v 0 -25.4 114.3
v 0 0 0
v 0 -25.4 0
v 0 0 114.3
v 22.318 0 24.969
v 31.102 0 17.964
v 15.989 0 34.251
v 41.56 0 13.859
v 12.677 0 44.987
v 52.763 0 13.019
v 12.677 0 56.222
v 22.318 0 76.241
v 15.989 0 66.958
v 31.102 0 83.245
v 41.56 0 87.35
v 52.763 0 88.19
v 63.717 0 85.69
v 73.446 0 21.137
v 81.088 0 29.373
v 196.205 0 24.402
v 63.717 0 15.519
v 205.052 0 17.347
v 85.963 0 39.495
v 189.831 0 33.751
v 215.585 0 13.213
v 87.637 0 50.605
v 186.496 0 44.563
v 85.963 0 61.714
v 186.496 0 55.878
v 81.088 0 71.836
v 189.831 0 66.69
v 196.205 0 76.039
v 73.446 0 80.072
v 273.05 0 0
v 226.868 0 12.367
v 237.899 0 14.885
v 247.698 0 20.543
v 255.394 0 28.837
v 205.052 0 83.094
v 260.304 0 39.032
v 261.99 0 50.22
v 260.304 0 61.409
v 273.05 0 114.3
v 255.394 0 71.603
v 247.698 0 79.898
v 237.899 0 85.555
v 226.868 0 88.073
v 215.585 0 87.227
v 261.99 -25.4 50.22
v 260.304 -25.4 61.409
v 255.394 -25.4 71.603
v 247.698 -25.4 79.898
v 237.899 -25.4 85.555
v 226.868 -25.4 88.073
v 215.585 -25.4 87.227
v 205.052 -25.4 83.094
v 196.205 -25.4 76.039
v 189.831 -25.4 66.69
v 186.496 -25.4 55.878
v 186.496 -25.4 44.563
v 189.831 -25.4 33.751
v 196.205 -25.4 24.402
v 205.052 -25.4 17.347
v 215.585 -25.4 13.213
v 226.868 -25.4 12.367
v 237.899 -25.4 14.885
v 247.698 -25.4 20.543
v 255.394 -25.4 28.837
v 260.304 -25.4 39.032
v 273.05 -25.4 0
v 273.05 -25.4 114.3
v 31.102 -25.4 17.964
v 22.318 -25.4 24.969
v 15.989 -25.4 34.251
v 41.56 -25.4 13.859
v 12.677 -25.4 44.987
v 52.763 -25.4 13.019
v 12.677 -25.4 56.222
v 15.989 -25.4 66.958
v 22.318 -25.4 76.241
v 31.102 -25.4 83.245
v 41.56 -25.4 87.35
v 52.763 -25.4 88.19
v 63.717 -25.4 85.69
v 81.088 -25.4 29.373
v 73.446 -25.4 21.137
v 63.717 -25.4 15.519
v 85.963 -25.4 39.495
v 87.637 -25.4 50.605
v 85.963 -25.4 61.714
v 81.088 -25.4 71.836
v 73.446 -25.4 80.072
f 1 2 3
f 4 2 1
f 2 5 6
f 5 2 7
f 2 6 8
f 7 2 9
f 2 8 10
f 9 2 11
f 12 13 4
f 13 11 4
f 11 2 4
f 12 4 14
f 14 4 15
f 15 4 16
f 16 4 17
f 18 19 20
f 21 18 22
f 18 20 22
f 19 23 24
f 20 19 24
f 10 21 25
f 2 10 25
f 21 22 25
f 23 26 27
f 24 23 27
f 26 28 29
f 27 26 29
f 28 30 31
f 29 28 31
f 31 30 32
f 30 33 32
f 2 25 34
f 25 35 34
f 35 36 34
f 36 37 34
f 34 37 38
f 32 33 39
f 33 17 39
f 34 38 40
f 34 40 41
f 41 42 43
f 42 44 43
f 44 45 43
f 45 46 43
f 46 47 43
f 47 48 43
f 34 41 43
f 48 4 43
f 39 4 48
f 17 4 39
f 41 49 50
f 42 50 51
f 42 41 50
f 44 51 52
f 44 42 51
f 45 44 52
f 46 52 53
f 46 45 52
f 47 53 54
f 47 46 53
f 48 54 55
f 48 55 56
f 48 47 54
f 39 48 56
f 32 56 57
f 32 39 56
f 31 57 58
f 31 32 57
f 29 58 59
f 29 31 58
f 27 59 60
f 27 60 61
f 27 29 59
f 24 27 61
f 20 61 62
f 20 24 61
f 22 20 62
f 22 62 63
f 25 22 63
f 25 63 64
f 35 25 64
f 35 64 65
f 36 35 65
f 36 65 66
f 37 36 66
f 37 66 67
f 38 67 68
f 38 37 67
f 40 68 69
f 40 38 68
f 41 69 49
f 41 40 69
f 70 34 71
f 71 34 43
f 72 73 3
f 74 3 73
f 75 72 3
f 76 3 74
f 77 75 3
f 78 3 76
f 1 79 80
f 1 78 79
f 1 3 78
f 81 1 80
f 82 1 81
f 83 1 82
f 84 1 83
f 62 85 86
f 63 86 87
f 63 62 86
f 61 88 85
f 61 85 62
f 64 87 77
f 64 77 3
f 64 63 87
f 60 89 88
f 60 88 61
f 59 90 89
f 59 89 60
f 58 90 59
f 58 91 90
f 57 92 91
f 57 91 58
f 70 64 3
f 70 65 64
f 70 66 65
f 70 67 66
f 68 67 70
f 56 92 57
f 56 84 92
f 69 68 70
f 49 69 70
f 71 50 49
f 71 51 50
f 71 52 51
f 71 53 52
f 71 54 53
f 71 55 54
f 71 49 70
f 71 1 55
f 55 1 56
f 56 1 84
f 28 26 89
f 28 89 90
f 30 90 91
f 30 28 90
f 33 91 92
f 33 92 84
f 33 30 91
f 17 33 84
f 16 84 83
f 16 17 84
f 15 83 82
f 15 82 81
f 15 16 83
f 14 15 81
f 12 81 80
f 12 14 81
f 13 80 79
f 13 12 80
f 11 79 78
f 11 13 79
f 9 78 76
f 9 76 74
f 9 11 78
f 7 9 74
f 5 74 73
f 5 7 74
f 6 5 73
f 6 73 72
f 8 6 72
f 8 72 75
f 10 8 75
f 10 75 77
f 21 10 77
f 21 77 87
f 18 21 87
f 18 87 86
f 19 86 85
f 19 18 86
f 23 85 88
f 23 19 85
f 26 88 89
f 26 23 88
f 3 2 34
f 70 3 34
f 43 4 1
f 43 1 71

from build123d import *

# Parameters (mm, degrees)
F0_W     = 273.05
F0_H     = 114.3
F2_DEPTH = 25.4
F1_R     = 37.690445
F1_R_2   = 37.958893
F4_DEPTH = 25.4
F5_DEPTH = 25.4
F6_DEPTH = 25.4
F7_DEPTH = 25.4


with BuildPart() as f2:
    # F0 (on Front) → F2 (new body)
    with BuildSketch(Plane.XZ):
        with Locations((136.525, 57.15)):
            Rectangle(F0_W, F0_H)
    extrude(amount=F2_DEPTH)

    # F1 (on face) → F4 (cut)
    with BuildSketch(Plane.XZ):
        with Locations((49.946755, 50.604541)):
            Circle(F1_R)
        with Locations((224.03121, 50.220247)):
            Circle(F1_R_2)
    extrude(amount=-F4_DEPTH, mode=Mode.SUBTRACT)

    # F1 (on face) → F5 (cut)
    with BuildSketch(Plane.XZ):
        with Locations((49.946755, 50.604541)):
            Circle(F1_R)
        with Locations((224.03121, 50.220247)):
            Circle(F1_R_2)
    extrude(amount=-F5_DEPTH, mode=Mode.SUBTRACT)

    # F1 (on face) → F6 (cut)
    with BuildSketch(Plane.XZ):
        with Locations((49.946755, 50.604541)):
            Circle(F1_R)
        with Locations((224.03121, 50.220247)):
            Circle(F1_R_2)
    extrude(amount=-F6_DEPTH, mode=Mode.SUBTRACT)

    # F1 (on face) → F7 (cut)
    with BuildSketch(Plane.XZ):
        with Locations((49.946755, 50.604541)):
            Circle(F1_R)
        with Locations((224.03121, 50.220247)):
            Circle(F1_R_2)
    extrude(amount=F7_DEPTH, mode=Mode.SUBTRACT)


solid = f2.part
